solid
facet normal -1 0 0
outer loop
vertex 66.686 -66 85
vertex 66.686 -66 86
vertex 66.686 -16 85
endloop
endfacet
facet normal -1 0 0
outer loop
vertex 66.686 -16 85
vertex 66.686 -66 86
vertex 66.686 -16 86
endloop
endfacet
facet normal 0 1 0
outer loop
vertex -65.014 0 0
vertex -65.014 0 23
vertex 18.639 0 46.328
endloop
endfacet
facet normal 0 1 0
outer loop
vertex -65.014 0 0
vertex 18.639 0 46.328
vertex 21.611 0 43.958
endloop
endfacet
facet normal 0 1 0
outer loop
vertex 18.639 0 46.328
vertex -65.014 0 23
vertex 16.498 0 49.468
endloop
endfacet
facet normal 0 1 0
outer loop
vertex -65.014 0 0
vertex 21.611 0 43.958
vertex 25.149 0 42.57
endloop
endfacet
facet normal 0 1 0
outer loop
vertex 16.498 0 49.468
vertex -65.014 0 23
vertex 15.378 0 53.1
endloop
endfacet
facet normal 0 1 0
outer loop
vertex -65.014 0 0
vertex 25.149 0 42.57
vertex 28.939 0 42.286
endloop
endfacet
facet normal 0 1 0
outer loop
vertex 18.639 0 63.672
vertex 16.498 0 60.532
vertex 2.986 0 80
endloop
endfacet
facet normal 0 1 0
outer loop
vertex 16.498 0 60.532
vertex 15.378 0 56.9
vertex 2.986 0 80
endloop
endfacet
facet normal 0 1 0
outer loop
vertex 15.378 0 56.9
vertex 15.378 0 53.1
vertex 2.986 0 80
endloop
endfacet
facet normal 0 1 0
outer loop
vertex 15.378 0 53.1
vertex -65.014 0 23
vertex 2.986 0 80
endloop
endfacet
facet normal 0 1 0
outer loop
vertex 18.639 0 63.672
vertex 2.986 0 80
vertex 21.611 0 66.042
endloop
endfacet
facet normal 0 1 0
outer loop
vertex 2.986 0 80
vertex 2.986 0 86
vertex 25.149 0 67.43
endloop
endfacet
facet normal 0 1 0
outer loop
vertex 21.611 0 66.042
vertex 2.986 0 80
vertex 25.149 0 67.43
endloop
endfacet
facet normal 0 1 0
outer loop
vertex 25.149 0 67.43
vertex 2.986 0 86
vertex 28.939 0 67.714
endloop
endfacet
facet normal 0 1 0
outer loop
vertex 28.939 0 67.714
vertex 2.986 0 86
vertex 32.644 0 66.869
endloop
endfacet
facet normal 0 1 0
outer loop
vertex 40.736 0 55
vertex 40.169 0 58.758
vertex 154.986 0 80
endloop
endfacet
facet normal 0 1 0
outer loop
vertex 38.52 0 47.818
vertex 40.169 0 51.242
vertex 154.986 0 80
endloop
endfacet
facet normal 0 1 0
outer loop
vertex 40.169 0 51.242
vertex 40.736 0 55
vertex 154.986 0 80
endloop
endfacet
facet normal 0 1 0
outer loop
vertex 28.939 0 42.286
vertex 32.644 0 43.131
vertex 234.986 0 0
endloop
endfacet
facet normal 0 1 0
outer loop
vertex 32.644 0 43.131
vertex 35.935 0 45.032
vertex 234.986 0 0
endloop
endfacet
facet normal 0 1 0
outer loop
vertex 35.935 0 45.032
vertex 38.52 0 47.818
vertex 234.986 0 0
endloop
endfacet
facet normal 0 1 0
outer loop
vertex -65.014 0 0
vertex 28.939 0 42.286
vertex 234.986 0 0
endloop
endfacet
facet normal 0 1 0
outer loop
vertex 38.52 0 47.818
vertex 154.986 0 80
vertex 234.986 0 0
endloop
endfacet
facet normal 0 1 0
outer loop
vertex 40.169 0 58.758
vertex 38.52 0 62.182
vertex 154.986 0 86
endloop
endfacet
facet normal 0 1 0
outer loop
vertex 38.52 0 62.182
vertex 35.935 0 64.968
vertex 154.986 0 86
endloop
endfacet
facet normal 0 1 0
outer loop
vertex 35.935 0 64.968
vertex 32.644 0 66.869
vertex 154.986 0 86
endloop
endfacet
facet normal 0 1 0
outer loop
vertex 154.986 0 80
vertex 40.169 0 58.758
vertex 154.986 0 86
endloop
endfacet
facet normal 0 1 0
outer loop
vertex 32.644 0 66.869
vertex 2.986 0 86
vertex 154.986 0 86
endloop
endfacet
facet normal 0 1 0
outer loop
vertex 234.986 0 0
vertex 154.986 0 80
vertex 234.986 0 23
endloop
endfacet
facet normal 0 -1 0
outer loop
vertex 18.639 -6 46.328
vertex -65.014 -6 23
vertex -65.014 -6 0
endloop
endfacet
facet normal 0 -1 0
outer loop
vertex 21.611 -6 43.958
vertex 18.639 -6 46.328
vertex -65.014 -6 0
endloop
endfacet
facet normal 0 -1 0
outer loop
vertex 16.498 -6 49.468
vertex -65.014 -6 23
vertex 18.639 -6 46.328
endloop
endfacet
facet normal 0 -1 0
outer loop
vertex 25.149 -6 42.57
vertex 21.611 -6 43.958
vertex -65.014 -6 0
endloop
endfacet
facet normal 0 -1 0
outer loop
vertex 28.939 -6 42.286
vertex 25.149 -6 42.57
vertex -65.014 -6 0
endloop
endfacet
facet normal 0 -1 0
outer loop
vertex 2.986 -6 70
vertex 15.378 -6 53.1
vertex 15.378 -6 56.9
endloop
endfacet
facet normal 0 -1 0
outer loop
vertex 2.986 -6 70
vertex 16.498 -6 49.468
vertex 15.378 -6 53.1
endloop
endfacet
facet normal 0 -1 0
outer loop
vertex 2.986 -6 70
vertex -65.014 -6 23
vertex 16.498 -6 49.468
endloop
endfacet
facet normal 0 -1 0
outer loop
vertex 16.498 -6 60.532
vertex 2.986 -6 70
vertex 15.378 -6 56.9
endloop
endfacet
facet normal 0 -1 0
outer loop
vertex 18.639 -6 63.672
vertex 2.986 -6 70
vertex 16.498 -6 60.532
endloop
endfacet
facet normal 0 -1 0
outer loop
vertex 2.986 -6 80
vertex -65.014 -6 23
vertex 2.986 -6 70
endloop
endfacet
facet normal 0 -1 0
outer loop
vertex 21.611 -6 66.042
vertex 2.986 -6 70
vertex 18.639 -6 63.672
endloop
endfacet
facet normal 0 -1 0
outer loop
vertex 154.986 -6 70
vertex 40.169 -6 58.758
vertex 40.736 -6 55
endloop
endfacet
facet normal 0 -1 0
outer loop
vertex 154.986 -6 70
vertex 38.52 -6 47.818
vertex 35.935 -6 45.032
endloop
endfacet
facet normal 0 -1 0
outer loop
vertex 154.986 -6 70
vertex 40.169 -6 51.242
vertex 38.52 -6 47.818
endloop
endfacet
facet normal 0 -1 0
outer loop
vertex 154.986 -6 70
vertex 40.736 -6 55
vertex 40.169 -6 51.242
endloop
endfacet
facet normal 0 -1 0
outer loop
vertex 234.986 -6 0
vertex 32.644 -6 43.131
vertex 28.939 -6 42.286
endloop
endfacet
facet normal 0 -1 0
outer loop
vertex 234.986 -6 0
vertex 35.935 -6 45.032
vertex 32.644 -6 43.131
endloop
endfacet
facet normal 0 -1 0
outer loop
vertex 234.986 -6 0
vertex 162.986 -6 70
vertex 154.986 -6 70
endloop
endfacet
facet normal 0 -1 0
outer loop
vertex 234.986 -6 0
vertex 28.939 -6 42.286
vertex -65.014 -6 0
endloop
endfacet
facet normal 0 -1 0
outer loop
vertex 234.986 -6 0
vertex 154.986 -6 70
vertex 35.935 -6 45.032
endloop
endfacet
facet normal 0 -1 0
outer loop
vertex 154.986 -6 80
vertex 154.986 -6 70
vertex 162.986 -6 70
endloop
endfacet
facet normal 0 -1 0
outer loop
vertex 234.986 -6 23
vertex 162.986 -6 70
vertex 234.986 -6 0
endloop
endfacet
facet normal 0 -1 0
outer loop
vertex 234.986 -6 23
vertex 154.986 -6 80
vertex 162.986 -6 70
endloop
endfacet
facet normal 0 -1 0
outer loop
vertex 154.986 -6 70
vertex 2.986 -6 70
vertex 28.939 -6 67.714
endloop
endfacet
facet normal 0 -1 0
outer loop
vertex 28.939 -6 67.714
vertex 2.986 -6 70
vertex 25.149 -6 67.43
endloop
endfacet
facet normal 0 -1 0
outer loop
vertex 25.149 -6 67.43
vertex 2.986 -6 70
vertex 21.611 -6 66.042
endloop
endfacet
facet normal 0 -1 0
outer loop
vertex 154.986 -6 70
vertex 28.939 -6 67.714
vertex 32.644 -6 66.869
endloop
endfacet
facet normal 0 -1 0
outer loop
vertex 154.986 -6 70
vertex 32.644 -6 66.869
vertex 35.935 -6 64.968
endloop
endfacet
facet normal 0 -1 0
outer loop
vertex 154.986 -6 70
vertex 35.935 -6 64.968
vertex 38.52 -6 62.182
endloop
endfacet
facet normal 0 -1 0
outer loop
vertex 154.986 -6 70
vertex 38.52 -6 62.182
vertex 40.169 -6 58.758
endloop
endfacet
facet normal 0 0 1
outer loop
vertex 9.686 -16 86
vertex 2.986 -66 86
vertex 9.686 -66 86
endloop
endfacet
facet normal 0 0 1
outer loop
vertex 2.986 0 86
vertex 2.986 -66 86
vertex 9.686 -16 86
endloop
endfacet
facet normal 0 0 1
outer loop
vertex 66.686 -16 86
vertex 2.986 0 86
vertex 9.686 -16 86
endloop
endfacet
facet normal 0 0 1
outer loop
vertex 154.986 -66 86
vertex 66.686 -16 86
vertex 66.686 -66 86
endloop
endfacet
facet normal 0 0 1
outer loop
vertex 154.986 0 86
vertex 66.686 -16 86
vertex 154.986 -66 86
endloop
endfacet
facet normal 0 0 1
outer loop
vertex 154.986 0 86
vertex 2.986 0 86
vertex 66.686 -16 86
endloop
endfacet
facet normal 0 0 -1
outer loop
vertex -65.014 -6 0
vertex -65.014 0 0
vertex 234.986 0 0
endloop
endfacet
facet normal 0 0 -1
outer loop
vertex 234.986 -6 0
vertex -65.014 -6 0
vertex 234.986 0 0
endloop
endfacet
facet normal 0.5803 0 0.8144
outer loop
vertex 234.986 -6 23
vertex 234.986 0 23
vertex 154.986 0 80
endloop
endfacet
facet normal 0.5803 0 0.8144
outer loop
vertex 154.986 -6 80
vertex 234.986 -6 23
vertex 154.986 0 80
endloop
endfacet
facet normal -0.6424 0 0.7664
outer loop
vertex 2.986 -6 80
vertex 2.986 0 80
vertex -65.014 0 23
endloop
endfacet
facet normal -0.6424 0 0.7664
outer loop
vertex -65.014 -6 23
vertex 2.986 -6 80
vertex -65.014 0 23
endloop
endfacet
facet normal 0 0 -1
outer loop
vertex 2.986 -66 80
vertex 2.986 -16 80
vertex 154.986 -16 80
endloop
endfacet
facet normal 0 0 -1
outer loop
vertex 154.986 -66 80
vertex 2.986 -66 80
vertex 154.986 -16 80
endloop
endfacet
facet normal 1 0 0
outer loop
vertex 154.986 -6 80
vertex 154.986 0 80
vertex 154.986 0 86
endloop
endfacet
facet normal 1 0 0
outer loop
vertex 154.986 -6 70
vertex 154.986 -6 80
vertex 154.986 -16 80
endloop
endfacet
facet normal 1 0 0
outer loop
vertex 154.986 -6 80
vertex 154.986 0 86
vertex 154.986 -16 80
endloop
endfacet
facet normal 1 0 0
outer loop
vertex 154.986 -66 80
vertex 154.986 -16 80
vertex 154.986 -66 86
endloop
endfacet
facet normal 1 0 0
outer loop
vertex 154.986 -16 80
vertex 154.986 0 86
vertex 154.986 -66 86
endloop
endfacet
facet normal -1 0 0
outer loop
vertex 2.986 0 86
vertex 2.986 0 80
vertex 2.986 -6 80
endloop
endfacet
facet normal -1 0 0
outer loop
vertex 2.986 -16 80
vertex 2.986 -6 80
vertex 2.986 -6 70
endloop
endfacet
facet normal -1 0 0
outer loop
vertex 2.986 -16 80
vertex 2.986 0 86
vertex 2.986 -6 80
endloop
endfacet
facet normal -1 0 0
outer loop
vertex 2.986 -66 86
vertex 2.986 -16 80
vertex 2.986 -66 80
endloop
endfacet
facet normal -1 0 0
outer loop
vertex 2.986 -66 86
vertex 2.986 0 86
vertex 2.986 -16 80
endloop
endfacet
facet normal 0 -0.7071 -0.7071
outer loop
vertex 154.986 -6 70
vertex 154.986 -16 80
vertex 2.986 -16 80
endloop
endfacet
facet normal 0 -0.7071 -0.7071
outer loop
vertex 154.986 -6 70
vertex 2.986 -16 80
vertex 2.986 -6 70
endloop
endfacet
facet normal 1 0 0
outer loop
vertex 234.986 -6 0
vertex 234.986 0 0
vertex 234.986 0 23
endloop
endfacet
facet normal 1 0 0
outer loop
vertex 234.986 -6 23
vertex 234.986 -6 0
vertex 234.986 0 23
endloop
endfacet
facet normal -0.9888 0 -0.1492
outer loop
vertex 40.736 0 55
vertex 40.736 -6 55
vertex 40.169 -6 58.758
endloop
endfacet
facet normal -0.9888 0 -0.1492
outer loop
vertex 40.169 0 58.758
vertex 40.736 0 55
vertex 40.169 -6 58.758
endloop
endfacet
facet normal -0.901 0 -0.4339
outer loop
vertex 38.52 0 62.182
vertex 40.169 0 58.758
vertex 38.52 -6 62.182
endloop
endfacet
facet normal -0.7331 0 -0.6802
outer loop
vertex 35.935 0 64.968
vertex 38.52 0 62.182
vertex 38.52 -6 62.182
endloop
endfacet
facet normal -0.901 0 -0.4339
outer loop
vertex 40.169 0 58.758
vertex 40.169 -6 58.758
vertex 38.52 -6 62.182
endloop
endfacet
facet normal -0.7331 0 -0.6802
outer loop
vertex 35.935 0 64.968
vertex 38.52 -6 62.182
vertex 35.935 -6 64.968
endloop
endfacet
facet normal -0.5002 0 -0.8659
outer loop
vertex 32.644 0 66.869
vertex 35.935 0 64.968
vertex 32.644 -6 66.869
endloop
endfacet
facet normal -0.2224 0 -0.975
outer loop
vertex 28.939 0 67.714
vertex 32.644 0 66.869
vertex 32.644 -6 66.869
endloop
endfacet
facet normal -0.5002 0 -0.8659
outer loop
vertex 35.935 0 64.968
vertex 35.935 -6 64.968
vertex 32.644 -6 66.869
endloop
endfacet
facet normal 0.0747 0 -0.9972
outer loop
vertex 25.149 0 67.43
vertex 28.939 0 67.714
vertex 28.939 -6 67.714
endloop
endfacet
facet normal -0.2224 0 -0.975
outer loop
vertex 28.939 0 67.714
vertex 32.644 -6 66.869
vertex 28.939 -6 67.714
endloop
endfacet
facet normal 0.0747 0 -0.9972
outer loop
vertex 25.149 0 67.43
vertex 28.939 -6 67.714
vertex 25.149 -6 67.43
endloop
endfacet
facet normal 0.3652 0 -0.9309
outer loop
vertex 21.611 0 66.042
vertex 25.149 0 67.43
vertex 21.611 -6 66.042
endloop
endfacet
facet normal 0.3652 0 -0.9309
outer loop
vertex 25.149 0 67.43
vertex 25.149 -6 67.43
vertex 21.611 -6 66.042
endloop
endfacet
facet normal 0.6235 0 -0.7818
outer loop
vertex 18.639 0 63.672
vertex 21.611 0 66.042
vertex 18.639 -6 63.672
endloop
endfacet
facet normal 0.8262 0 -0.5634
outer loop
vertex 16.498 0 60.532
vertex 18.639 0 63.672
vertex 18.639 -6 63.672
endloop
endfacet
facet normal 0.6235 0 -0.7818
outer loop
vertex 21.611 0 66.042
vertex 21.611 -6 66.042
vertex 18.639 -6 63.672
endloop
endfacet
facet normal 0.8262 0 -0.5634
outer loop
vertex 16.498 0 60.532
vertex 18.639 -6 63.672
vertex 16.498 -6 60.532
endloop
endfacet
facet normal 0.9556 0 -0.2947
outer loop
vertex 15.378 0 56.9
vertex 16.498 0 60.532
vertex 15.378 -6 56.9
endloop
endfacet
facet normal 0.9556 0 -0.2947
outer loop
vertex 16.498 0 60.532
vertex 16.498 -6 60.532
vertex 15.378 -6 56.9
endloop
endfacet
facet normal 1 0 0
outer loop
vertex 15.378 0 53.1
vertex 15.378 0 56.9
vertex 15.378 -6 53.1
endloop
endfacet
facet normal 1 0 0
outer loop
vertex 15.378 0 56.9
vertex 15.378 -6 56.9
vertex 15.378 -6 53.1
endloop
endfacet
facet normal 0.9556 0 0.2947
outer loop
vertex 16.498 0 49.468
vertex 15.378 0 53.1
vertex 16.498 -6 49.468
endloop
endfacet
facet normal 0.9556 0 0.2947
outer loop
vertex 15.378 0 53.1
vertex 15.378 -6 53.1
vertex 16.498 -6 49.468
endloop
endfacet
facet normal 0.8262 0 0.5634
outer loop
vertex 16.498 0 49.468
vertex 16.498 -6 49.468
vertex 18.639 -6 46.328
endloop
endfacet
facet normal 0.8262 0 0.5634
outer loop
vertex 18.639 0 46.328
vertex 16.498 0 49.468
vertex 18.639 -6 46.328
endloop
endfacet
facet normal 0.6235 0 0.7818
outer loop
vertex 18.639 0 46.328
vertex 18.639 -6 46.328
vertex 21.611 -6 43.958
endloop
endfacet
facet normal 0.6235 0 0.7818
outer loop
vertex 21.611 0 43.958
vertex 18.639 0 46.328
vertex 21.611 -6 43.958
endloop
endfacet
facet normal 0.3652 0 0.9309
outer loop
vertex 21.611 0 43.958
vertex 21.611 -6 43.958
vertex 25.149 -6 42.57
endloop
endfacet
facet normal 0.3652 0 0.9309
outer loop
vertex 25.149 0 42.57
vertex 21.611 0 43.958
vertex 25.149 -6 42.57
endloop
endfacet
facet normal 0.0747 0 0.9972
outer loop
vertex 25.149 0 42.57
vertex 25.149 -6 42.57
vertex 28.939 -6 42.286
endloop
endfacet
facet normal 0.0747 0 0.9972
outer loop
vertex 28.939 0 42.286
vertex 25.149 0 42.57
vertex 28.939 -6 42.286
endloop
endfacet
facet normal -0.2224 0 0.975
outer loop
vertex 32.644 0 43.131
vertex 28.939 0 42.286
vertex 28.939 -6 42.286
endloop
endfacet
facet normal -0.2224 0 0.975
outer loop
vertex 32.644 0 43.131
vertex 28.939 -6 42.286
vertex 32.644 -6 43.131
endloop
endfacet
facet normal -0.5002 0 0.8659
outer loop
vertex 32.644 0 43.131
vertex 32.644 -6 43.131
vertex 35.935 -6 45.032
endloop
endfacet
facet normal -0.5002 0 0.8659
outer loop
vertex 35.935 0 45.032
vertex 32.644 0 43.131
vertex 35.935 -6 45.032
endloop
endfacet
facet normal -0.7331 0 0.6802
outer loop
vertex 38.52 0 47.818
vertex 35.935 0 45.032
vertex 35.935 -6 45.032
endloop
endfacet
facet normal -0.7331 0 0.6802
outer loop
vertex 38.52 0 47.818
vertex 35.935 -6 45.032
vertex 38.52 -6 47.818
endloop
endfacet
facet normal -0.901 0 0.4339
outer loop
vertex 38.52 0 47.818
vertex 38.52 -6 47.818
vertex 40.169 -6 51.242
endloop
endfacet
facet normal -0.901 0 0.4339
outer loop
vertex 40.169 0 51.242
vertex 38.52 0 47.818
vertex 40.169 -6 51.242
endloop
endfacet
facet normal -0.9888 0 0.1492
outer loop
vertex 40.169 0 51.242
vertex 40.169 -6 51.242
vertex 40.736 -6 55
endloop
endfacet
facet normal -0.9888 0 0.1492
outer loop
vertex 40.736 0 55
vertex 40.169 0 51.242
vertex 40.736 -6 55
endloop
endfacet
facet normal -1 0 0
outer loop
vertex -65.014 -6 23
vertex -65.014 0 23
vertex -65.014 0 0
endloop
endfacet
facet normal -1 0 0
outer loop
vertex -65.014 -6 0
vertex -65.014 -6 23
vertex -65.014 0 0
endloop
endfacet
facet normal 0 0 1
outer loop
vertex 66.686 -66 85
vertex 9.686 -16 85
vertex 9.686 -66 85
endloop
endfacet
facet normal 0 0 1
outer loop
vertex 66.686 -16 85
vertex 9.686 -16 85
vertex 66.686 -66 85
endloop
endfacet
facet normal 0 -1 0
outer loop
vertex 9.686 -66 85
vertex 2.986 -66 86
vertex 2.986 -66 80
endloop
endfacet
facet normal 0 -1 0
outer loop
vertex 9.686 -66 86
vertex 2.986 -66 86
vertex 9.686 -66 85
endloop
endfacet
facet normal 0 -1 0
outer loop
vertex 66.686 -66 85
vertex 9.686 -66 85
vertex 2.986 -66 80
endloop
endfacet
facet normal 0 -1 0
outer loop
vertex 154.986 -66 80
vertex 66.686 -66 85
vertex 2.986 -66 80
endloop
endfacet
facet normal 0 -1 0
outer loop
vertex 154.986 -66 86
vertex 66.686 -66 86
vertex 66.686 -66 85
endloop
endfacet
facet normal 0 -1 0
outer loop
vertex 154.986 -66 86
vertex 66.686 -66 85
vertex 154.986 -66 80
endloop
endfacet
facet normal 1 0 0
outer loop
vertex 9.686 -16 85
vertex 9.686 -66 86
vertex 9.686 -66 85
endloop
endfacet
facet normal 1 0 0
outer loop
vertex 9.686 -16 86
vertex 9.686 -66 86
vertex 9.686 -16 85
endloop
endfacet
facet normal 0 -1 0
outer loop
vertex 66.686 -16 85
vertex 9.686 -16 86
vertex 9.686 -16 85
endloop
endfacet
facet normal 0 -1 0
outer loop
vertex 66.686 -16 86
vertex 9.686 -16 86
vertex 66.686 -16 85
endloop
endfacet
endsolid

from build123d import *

# Parameters (mm, degrees)
F1_DEPTH  = 6
F2_W      = 152
F2_H      = 6
F3_DEPTH  = 60
F4_W      = 57
F4_H      = 50
F5_DEPTH  = 1
F6_W      = 152
F6_H      = 10
F7_DEPTH  = 10
F9_DEPTH  = 160
F10_R     = 12.75
F11_DEPTH = 25


with BuildPart() as f1:
    # F0 (on Front) → F1 (new body)
    with BuildSketch(Plane.XZ):
        Polygon((-65.014175, 23), (-65.014175, 0), (234.985825, 0), (234.985825, 23), (154.985825, 80), (154.985825, 86), (2.985825, 86), (2.985825, 80), align=None)
    extrude(amount=F1_DEPTH)

    # F2 (on face) → F3 (join)
    with BuildSketch(Plane.XZ.offset(6)):
        with Locations((78.985825, 83)):
            Rectangle(F2_W, F2_H)
    extrude(amount=F3_DEPTH)

    # F4 (on face) → F5 (cut)
    with BuildSketch(Plane.XY.offset(86)):
        with Locations((38.185825, -41)):
            Rectangle(F4_W, F4_H)
    extrude(amount=-F5_DEPTH, mode=Mode.SUBTRACT)

    # F6 (on face) → F7 (join)
    with BuildSketch(Plane(origin=(0, 0, 80), x_dir=(1, 0, 0), z_dir=(0, 0, -1))):
        with Locations((78.985825, 11)):
            Rectangle(F6_W, F6_H)
    extrude(amount=F7_DEPTH)

    # F8 (on face) → F9 (cut)
    with BuildSketch(Plane(origin=(2.985825, 0, 0), x_dir=(0, -1, 0), z_dir=(-1, 0, 0))):
        Polygon((16, 70), (16, 80), (6, 70), align=None)
    extrude(amount=-F9_DEPTH, mode=Mode.SUBTRACT)

    # F10 (on face) → F11 (cut)
    with BuildSketch(Plane.XZ.offset(6)):
        with Locations((27.985825, 55)):
            Circle(F10_R)
    extrude(amount=-F11_DEPTH, mode=Mode.SUBTRACT)


solid = f1.part
